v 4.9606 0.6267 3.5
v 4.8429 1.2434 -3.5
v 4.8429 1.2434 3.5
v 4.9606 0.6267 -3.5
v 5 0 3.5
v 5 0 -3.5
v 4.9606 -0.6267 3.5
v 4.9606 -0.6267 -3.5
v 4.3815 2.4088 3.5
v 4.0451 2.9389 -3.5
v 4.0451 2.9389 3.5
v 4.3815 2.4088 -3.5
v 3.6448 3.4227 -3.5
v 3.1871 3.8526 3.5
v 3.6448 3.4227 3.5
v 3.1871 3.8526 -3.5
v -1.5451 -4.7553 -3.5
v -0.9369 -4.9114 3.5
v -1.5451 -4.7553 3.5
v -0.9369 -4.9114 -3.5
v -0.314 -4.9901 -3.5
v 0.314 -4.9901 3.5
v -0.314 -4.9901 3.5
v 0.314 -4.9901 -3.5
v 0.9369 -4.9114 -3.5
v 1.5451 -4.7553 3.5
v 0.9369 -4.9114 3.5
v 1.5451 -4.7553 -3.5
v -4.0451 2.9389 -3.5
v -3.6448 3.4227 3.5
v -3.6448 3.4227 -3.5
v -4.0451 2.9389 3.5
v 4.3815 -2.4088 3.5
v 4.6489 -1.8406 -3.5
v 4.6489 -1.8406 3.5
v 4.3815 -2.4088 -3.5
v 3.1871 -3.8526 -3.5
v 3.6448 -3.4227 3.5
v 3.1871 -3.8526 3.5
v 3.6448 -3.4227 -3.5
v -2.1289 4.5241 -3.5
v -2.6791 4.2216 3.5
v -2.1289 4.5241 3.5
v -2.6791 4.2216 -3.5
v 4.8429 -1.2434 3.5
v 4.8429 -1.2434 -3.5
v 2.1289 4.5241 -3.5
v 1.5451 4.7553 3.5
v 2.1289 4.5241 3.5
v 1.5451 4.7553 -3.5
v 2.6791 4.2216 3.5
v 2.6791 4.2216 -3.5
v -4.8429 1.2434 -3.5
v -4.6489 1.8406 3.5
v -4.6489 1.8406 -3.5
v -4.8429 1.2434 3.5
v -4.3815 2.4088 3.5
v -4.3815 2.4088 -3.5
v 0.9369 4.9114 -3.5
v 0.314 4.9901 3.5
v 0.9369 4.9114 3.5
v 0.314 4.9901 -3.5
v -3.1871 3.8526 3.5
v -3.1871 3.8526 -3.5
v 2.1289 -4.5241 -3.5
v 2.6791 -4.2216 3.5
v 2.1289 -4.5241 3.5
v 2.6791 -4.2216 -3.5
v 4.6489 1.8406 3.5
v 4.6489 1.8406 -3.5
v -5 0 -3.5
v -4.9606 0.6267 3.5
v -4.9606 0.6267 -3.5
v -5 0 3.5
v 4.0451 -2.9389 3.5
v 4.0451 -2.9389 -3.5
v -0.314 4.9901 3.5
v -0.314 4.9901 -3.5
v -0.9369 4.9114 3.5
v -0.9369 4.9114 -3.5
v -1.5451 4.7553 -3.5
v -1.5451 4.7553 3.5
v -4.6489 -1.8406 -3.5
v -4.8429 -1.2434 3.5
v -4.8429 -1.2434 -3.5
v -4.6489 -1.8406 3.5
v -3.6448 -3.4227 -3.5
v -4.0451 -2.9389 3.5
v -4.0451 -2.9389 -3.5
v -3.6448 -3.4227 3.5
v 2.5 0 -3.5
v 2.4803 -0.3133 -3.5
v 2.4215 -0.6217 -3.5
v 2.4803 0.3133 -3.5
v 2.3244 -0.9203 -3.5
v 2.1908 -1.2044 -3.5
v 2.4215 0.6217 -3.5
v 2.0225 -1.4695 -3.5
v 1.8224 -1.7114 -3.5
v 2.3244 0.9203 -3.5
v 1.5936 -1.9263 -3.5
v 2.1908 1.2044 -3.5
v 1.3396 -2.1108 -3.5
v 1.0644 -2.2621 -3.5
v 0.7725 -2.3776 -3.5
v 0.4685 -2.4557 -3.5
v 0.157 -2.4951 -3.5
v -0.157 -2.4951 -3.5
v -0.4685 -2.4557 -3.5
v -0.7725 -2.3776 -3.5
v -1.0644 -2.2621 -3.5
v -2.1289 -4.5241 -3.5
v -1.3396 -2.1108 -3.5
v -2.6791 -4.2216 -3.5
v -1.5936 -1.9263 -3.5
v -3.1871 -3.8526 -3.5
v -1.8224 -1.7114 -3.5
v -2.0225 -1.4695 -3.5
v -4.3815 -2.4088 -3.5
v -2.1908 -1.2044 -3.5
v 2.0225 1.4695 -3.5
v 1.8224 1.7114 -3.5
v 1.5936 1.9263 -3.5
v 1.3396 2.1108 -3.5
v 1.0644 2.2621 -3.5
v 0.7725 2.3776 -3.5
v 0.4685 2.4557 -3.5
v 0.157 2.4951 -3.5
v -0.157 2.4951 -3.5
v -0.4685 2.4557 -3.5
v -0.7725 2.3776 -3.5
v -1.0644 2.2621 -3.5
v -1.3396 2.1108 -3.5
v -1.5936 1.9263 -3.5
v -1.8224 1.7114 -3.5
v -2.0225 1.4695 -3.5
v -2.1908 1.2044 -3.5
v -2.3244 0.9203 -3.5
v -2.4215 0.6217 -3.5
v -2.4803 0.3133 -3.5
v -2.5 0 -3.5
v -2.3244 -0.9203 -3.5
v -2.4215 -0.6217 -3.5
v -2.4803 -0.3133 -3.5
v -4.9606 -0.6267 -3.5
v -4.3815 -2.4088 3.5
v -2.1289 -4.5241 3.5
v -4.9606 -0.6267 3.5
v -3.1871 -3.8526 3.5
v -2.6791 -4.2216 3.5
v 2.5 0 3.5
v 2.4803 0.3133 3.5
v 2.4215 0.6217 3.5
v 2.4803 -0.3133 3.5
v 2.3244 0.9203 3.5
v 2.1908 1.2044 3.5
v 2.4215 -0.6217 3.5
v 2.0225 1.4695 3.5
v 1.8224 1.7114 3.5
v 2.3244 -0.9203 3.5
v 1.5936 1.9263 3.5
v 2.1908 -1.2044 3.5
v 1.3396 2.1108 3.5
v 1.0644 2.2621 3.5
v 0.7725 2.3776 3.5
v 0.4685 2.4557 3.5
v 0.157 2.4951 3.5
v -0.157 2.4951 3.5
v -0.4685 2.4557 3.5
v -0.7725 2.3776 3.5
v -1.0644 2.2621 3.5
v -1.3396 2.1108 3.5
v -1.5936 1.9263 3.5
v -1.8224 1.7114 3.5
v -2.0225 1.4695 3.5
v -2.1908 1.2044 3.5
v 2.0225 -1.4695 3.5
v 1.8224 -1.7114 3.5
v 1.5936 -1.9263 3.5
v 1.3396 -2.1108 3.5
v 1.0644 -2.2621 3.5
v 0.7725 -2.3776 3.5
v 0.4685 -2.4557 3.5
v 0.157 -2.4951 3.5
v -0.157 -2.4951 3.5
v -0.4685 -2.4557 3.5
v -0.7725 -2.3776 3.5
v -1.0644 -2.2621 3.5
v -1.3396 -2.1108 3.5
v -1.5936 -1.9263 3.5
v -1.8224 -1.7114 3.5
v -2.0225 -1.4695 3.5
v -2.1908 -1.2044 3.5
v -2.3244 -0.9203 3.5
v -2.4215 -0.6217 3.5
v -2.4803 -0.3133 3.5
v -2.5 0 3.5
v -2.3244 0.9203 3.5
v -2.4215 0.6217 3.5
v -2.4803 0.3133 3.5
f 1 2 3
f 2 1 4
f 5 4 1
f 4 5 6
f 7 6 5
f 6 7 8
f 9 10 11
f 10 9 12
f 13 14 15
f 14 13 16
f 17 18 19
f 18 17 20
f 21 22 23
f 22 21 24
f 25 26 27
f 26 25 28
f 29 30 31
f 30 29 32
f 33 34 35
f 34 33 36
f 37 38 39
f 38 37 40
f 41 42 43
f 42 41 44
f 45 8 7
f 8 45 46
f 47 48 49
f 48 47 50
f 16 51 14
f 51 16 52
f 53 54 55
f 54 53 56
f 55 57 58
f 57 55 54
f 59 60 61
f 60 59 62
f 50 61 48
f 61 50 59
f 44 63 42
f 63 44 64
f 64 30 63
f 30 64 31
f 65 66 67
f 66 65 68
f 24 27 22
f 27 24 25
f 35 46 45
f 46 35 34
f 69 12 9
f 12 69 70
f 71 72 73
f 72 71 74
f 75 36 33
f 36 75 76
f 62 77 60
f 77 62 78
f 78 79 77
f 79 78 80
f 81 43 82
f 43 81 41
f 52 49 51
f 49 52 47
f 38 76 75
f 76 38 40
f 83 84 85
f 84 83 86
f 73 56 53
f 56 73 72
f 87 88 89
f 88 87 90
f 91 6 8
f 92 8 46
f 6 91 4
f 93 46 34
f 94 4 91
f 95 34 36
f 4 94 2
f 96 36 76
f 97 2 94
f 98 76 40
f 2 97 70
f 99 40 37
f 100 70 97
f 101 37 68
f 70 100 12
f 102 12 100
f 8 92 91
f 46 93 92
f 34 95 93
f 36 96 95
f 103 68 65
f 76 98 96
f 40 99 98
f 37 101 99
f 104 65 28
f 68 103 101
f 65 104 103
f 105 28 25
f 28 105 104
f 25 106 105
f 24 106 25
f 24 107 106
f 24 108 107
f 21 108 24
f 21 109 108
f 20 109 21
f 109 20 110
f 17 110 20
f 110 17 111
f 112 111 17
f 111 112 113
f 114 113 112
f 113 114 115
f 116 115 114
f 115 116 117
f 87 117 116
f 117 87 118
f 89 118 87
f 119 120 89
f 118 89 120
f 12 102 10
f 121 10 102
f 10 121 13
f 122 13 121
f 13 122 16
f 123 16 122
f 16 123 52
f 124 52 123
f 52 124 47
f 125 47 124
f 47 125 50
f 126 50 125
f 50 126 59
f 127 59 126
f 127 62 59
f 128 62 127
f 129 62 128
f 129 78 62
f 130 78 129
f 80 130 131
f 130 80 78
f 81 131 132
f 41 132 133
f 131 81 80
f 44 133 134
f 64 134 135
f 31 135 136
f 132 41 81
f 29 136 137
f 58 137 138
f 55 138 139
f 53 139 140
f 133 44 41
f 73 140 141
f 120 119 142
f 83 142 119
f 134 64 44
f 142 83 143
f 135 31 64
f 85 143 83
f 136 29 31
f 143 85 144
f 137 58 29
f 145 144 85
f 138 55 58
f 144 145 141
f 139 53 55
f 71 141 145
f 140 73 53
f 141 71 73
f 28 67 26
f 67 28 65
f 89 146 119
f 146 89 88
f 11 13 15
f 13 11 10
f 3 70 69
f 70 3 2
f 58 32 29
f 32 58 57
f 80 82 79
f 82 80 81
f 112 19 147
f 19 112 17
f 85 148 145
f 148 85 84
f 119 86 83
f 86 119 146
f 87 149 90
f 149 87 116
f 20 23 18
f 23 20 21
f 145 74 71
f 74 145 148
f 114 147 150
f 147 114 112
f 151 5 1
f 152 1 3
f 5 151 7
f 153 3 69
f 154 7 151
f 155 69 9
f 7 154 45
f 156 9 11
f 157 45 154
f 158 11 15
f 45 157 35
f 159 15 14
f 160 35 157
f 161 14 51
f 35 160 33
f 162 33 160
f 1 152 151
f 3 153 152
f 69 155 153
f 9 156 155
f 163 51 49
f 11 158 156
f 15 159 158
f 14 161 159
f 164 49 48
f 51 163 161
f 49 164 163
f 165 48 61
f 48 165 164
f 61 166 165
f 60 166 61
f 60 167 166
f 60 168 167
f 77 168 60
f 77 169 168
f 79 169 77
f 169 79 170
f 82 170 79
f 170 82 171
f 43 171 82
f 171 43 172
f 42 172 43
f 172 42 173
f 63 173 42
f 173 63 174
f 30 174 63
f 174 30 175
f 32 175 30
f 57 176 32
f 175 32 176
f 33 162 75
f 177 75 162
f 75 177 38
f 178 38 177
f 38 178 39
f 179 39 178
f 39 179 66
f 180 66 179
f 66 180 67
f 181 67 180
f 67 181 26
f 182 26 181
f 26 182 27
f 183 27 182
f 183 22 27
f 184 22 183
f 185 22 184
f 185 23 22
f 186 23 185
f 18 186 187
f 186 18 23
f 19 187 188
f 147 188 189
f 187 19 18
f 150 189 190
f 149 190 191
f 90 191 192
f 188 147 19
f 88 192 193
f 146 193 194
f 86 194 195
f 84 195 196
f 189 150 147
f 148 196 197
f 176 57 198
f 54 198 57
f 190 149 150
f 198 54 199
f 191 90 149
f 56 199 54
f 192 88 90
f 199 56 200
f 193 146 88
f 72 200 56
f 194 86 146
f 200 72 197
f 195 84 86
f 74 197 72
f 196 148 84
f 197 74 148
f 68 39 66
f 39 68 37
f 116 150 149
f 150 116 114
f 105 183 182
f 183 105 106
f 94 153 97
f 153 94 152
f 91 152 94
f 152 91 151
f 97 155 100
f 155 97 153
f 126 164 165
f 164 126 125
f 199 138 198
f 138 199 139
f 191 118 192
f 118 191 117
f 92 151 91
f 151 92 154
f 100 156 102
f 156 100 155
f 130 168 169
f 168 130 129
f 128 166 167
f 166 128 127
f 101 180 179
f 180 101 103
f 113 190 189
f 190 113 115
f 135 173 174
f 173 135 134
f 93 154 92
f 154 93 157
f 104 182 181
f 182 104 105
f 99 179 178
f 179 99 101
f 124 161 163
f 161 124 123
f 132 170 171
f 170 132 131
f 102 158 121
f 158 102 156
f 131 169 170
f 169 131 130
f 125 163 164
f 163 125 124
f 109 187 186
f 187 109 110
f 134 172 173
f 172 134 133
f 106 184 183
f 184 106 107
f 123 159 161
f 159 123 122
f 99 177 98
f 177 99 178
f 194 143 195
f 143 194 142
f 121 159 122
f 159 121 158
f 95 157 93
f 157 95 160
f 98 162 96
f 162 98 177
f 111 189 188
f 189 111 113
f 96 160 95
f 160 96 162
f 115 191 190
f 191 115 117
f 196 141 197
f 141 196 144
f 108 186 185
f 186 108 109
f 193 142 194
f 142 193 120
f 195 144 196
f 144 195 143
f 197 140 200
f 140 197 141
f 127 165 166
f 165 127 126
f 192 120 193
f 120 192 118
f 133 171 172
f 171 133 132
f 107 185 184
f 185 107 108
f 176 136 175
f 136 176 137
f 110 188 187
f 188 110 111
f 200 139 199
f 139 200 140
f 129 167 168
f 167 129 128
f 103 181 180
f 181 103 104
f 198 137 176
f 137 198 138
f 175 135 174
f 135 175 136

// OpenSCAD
$fn = 50;


difference() {
	union() {
		translate(v = [0, 0, -3.5000000000]) {
			cylinder(h = 7, r = 5.0000000000);
		}
	}
	union() {
		translate(v = [0, 0, -100.0000000000]) {
			cylinder(h = 200, r = 2.5000000000);
		}
	}
}
